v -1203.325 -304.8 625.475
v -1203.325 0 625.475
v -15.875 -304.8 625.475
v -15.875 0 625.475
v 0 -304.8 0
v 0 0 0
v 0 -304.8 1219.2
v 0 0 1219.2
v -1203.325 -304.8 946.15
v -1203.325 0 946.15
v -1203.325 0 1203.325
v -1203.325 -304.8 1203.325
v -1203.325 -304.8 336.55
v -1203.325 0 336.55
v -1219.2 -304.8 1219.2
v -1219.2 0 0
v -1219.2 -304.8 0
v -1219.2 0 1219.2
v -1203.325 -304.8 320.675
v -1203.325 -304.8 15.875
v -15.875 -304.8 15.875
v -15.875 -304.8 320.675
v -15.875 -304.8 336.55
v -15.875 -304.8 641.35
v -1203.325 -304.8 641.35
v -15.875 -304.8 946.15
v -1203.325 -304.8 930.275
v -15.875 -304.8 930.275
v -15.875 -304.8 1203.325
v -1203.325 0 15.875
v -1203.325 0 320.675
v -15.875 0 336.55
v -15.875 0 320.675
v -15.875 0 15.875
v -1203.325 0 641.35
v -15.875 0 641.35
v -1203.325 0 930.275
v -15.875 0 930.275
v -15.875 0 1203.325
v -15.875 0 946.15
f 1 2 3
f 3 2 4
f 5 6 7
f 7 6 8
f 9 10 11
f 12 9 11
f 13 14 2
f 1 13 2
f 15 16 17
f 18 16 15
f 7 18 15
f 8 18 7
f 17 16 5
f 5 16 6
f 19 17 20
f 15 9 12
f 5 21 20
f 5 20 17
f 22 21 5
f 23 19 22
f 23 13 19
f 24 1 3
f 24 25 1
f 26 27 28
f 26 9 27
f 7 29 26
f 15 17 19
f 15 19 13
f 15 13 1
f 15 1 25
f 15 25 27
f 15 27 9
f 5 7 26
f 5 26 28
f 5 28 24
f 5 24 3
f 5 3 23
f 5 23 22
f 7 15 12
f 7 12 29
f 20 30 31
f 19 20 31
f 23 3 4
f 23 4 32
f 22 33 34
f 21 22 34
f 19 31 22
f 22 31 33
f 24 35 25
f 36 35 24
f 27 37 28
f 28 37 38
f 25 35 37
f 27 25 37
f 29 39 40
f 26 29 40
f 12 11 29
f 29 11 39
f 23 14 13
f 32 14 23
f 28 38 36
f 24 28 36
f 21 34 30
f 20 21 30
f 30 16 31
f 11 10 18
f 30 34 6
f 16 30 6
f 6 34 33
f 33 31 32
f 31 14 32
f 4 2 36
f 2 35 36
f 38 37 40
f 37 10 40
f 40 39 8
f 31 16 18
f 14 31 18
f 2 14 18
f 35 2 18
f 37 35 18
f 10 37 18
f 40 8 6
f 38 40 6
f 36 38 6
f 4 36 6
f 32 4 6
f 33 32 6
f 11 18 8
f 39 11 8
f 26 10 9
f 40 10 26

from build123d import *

# Parameters (mm, degrees)
F0_W     = 1219.2
F0_H     = 1219.2
F0_W_2   = 1187.45
F0_H_2   = 15.875
F1_DEPTH = 304.8


with BuildPart() as f1:
    # F0 (on Front) → F1 (new body)
    with BuildSketch(Plane.XZ):
        with Locations((-609.6, 609.6)):
            Rectangle(F0_W, F0_H)
        Polygon((-1203.325, 946.15), (-1203.325, 1203.325), (-15.875, 1203.325), (-15.875, 946.15), (-15.875, 930.275), (-15.875, 641.35), (-15.875, 625.475), (-15.875, 336.55), (-15.875, 320.675), (-15.875, 15.875), (-1203.325, 15.875), (-1203.325, 320.675), (-1203.325, 336.55), (-1203.325, 625.475), (-1203.325, 641.35), (-1203.325, 930.275), align=None, mode=Mode.SUBTRACT)
        with Locations((-609.6, 938.2125)):
            Rectangle(F0_W_2, F0_H_2)
        with Locations((-609.6, 633.4125)):
            Rectangle(F0_W_2, F0_H_2)
        with Locations((-609.6, 328.6125)):
            Rectangle(F0_W_2, F0_H_2)
    extrude(amount=F1_DEPTH)


solid = f1.part
